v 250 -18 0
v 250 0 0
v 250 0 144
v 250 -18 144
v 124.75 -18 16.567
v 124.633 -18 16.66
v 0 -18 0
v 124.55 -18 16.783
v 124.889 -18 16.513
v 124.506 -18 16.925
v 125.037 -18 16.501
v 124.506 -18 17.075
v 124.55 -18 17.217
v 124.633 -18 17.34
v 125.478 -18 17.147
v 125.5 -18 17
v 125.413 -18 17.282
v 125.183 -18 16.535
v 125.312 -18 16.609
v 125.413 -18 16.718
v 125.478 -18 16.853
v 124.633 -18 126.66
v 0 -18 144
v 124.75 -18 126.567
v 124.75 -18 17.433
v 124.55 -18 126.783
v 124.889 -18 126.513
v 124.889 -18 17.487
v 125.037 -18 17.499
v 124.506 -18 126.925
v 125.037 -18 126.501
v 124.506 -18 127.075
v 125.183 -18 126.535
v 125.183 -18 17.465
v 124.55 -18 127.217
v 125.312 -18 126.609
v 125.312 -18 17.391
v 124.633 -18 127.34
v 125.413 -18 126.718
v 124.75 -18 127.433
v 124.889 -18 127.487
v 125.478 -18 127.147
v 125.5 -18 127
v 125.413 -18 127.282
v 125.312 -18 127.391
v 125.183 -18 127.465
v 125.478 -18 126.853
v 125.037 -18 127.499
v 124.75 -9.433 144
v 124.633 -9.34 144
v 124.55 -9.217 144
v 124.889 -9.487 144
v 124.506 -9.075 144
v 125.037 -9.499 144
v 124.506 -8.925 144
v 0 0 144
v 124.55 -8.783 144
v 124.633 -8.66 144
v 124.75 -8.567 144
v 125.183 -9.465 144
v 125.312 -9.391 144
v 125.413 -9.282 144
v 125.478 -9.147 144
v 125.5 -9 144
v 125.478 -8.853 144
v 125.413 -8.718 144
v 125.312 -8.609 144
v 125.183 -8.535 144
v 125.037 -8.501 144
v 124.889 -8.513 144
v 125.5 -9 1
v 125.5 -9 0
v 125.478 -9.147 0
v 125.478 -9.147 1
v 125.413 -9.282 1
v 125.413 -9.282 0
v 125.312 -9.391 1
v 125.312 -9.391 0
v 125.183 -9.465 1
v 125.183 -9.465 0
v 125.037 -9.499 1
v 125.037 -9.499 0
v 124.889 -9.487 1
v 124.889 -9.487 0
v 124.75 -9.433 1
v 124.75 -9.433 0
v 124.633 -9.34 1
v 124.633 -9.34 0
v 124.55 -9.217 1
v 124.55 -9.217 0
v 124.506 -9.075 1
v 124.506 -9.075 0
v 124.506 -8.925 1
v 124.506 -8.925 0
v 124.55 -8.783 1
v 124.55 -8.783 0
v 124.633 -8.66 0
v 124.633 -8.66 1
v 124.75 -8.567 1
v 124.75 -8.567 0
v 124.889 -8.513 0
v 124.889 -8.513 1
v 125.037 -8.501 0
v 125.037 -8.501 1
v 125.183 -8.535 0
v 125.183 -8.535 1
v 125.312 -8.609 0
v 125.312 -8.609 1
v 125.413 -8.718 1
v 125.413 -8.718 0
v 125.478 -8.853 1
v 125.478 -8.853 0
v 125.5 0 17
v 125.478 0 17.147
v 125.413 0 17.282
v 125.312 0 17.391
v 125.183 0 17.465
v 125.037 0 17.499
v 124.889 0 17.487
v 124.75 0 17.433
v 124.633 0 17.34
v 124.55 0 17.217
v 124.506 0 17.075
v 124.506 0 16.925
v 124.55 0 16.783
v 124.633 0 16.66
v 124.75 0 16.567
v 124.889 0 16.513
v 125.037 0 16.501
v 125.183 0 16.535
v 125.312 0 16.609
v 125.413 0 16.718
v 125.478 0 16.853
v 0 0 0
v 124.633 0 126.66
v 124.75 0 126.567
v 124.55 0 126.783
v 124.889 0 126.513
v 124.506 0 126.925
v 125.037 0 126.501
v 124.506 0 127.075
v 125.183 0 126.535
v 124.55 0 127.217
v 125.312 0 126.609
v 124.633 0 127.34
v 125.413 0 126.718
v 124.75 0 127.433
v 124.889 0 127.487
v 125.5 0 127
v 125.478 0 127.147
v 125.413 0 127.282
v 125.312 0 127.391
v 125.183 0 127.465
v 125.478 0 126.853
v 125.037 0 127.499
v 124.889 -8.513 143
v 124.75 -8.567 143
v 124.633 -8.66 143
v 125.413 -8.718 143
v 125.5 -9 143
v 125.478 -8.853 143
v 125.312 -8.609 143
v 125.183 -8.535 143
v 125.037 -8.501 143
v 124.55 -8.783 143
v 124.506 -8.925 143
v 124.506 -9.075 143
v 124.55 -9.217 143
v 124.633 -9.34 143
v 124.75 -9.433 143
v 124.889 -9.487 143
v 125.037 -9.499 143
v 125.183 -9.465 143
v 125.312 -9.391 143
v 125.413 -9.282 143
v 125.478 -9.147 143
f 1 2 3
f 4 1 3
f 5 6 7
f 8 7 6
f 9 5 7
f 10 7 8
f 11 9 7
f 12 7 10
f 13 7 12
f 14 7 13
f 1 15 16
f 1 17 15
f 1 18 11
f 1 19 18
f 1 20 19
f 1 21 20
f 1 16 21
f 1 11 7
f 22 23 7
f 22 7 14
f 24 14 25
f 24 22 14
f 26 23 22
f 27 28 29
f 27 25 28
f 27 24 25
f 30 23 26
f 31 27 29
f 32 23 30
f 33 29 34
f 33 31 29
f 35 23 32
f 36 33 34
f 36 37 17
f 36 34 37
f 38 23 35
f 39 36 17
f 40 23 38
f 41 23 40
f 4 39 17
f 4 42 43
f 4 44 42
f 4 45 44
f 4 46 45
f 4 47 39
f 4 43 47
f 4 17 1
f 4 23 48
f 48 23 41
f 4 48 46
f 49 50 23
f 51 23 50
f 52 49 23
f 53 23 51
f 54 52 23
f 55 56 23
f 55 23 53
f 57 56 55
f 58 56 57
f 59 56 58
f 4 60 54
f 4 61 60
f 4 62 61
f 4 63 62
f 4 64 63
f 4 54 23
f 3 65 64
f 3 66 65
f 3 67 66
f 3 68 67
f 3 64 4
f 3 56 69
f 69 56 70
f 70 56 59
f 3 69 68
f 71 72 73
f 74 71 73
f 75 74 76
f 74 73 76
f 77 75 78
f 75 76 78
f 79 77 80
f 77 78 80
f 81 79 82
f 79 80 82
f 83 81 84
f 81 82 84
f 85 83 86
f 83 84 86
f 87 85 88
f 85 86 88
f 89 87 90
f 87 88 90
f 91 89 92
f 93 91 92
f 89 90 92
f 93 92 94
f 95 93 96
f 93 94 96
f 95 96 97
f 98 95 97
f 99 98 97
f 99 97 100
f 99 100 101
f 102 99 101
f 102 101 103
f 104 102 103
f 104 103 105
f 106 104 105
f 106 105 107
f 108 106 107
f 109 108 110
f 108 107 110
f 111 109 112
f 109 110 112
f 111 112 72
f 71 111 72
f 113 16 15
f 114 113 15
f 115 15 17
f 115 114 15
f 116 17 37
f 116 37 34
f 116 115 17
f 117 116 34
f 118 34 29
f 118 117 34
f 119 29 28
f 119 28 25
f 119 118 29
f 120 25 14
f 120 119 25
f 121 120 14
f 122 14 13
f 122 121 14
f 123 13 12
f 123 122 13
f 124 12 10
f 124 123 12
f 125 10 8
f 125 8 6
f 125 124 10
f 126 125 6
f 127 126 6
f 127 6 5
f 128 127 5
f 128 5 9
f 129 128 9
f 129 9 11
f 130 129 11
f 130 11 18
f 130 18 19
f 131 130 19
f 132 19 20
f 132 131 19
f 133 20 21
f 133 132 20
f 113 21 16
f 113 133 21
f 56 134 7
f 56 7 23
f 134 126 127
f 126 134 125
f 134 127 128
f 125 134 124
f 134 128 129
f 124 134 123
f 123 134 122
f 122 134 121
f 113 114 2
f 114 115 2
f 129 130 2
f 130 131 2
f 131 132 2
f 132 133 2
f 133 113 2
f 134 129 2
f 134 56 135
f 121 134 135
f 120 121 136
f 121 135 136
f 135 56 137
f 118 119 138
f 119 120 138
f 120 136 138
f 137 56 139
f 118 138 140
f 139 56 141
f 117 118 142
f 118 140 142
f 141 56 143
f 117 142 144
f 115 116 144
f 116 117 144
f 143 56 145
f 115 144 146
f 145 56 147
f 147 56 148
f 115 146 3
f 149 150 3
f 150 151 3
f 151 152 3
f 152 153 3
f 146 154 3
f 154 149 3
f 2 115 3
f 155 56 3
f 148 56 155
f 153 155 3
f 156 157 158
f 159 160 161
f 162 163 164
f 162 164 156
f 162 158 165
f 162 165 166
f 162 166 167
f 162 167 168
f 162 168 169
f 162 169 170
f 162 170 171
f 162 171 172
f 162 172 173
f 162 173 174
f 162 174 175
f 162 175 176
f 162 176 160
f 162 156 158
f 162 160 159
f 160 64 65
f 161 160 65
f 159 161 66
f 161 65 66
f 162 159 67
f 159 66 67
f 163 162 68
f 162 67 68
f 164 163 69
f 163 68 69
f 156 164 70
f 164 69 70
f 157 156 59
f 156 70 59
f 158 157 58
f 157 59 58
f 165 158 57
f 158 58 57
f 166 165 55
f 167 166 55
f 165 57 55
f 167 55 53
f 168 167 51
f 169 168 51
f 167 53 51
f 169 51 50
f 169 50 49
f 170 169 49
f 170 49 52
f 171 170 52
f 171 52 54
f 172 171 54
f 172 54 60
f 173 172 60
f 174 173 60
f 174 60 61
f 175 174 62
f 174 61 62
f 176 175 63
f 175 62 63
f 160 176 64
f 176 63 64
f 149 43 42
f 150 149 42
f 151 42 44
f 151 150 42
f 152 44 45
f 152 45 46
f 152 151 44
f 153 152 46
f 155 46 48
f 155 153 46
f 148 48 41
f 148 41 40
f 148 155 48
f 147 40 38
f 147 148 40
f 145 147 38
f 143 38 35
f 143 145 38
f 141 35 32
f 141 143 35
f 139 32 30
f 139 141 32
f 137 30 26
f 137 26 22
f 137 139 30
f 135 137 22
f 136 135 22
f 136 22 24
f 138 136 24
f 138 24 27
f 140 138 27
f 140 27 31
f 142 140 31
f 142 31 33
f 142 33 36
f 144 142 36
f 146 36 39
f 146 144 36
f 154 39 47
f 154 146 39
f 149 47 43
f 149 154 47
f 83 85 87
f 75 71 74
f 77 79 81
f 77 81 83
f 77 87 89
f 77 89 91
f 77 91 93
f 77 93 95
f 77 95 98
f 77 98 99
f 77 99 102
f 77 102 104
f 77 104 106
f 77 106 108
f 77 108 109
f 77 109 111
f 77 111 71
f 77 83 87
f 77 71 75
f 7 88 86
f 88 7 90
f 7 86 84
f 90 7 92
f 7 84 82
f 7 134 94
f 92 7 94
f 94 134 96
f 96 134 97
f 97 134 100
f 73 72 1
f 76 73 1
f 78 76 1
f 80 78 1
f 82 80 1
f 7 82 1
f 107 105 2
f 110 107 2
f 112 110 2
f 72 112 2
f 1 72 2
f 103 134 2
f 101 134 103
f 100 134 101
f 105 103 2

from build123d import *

# Parameters (mm, degrees)
F0_W     = 250
F0_H     = 144
F0_R     = 0.5
F1_DEPTH = 18
F2_R     = 0.5
F3_DEPTH = 1
F4_R     = 0.5
F5_DEPTH = 1


with BuildPart() as f1:
    # F0 (on Front) → F1 (new body)
    with BuildSketch(Plane.XZ):
        with Locations((125, 72)):
            Rectangle(F0_W, F0_H)
        with Locations((125, 17)):
            Circle(F0_R, mode=Mode.SUBTRACT)
        with Locations((125, 127)):
            Circle(F0_R, mode=Mode.SUBTRACT)
    extrude(amount=F1_DEPTH)

    # F2 (on face) → F3 (cut)
    with BuildSketch(Plane(origin=(0, 0, 0), x_dir=(1, 0, 0), z_dir=(0, 0, -1))):
        with Locations((125, 9)):
            Circle(F2_R)
    extrude(amount=-F3_DEPTH, mode=Mode.SUBTRACT)

    # F4 (on face) → F5 (cut)
    with BuildSketch(Plane.XY.offset(144)):
        with Locations((125, -9)):
            Circle(F4_R)
    extrude(amount=-F5_DEPTH, mode=Mode.SUBTRACT)


solid = f1.part
